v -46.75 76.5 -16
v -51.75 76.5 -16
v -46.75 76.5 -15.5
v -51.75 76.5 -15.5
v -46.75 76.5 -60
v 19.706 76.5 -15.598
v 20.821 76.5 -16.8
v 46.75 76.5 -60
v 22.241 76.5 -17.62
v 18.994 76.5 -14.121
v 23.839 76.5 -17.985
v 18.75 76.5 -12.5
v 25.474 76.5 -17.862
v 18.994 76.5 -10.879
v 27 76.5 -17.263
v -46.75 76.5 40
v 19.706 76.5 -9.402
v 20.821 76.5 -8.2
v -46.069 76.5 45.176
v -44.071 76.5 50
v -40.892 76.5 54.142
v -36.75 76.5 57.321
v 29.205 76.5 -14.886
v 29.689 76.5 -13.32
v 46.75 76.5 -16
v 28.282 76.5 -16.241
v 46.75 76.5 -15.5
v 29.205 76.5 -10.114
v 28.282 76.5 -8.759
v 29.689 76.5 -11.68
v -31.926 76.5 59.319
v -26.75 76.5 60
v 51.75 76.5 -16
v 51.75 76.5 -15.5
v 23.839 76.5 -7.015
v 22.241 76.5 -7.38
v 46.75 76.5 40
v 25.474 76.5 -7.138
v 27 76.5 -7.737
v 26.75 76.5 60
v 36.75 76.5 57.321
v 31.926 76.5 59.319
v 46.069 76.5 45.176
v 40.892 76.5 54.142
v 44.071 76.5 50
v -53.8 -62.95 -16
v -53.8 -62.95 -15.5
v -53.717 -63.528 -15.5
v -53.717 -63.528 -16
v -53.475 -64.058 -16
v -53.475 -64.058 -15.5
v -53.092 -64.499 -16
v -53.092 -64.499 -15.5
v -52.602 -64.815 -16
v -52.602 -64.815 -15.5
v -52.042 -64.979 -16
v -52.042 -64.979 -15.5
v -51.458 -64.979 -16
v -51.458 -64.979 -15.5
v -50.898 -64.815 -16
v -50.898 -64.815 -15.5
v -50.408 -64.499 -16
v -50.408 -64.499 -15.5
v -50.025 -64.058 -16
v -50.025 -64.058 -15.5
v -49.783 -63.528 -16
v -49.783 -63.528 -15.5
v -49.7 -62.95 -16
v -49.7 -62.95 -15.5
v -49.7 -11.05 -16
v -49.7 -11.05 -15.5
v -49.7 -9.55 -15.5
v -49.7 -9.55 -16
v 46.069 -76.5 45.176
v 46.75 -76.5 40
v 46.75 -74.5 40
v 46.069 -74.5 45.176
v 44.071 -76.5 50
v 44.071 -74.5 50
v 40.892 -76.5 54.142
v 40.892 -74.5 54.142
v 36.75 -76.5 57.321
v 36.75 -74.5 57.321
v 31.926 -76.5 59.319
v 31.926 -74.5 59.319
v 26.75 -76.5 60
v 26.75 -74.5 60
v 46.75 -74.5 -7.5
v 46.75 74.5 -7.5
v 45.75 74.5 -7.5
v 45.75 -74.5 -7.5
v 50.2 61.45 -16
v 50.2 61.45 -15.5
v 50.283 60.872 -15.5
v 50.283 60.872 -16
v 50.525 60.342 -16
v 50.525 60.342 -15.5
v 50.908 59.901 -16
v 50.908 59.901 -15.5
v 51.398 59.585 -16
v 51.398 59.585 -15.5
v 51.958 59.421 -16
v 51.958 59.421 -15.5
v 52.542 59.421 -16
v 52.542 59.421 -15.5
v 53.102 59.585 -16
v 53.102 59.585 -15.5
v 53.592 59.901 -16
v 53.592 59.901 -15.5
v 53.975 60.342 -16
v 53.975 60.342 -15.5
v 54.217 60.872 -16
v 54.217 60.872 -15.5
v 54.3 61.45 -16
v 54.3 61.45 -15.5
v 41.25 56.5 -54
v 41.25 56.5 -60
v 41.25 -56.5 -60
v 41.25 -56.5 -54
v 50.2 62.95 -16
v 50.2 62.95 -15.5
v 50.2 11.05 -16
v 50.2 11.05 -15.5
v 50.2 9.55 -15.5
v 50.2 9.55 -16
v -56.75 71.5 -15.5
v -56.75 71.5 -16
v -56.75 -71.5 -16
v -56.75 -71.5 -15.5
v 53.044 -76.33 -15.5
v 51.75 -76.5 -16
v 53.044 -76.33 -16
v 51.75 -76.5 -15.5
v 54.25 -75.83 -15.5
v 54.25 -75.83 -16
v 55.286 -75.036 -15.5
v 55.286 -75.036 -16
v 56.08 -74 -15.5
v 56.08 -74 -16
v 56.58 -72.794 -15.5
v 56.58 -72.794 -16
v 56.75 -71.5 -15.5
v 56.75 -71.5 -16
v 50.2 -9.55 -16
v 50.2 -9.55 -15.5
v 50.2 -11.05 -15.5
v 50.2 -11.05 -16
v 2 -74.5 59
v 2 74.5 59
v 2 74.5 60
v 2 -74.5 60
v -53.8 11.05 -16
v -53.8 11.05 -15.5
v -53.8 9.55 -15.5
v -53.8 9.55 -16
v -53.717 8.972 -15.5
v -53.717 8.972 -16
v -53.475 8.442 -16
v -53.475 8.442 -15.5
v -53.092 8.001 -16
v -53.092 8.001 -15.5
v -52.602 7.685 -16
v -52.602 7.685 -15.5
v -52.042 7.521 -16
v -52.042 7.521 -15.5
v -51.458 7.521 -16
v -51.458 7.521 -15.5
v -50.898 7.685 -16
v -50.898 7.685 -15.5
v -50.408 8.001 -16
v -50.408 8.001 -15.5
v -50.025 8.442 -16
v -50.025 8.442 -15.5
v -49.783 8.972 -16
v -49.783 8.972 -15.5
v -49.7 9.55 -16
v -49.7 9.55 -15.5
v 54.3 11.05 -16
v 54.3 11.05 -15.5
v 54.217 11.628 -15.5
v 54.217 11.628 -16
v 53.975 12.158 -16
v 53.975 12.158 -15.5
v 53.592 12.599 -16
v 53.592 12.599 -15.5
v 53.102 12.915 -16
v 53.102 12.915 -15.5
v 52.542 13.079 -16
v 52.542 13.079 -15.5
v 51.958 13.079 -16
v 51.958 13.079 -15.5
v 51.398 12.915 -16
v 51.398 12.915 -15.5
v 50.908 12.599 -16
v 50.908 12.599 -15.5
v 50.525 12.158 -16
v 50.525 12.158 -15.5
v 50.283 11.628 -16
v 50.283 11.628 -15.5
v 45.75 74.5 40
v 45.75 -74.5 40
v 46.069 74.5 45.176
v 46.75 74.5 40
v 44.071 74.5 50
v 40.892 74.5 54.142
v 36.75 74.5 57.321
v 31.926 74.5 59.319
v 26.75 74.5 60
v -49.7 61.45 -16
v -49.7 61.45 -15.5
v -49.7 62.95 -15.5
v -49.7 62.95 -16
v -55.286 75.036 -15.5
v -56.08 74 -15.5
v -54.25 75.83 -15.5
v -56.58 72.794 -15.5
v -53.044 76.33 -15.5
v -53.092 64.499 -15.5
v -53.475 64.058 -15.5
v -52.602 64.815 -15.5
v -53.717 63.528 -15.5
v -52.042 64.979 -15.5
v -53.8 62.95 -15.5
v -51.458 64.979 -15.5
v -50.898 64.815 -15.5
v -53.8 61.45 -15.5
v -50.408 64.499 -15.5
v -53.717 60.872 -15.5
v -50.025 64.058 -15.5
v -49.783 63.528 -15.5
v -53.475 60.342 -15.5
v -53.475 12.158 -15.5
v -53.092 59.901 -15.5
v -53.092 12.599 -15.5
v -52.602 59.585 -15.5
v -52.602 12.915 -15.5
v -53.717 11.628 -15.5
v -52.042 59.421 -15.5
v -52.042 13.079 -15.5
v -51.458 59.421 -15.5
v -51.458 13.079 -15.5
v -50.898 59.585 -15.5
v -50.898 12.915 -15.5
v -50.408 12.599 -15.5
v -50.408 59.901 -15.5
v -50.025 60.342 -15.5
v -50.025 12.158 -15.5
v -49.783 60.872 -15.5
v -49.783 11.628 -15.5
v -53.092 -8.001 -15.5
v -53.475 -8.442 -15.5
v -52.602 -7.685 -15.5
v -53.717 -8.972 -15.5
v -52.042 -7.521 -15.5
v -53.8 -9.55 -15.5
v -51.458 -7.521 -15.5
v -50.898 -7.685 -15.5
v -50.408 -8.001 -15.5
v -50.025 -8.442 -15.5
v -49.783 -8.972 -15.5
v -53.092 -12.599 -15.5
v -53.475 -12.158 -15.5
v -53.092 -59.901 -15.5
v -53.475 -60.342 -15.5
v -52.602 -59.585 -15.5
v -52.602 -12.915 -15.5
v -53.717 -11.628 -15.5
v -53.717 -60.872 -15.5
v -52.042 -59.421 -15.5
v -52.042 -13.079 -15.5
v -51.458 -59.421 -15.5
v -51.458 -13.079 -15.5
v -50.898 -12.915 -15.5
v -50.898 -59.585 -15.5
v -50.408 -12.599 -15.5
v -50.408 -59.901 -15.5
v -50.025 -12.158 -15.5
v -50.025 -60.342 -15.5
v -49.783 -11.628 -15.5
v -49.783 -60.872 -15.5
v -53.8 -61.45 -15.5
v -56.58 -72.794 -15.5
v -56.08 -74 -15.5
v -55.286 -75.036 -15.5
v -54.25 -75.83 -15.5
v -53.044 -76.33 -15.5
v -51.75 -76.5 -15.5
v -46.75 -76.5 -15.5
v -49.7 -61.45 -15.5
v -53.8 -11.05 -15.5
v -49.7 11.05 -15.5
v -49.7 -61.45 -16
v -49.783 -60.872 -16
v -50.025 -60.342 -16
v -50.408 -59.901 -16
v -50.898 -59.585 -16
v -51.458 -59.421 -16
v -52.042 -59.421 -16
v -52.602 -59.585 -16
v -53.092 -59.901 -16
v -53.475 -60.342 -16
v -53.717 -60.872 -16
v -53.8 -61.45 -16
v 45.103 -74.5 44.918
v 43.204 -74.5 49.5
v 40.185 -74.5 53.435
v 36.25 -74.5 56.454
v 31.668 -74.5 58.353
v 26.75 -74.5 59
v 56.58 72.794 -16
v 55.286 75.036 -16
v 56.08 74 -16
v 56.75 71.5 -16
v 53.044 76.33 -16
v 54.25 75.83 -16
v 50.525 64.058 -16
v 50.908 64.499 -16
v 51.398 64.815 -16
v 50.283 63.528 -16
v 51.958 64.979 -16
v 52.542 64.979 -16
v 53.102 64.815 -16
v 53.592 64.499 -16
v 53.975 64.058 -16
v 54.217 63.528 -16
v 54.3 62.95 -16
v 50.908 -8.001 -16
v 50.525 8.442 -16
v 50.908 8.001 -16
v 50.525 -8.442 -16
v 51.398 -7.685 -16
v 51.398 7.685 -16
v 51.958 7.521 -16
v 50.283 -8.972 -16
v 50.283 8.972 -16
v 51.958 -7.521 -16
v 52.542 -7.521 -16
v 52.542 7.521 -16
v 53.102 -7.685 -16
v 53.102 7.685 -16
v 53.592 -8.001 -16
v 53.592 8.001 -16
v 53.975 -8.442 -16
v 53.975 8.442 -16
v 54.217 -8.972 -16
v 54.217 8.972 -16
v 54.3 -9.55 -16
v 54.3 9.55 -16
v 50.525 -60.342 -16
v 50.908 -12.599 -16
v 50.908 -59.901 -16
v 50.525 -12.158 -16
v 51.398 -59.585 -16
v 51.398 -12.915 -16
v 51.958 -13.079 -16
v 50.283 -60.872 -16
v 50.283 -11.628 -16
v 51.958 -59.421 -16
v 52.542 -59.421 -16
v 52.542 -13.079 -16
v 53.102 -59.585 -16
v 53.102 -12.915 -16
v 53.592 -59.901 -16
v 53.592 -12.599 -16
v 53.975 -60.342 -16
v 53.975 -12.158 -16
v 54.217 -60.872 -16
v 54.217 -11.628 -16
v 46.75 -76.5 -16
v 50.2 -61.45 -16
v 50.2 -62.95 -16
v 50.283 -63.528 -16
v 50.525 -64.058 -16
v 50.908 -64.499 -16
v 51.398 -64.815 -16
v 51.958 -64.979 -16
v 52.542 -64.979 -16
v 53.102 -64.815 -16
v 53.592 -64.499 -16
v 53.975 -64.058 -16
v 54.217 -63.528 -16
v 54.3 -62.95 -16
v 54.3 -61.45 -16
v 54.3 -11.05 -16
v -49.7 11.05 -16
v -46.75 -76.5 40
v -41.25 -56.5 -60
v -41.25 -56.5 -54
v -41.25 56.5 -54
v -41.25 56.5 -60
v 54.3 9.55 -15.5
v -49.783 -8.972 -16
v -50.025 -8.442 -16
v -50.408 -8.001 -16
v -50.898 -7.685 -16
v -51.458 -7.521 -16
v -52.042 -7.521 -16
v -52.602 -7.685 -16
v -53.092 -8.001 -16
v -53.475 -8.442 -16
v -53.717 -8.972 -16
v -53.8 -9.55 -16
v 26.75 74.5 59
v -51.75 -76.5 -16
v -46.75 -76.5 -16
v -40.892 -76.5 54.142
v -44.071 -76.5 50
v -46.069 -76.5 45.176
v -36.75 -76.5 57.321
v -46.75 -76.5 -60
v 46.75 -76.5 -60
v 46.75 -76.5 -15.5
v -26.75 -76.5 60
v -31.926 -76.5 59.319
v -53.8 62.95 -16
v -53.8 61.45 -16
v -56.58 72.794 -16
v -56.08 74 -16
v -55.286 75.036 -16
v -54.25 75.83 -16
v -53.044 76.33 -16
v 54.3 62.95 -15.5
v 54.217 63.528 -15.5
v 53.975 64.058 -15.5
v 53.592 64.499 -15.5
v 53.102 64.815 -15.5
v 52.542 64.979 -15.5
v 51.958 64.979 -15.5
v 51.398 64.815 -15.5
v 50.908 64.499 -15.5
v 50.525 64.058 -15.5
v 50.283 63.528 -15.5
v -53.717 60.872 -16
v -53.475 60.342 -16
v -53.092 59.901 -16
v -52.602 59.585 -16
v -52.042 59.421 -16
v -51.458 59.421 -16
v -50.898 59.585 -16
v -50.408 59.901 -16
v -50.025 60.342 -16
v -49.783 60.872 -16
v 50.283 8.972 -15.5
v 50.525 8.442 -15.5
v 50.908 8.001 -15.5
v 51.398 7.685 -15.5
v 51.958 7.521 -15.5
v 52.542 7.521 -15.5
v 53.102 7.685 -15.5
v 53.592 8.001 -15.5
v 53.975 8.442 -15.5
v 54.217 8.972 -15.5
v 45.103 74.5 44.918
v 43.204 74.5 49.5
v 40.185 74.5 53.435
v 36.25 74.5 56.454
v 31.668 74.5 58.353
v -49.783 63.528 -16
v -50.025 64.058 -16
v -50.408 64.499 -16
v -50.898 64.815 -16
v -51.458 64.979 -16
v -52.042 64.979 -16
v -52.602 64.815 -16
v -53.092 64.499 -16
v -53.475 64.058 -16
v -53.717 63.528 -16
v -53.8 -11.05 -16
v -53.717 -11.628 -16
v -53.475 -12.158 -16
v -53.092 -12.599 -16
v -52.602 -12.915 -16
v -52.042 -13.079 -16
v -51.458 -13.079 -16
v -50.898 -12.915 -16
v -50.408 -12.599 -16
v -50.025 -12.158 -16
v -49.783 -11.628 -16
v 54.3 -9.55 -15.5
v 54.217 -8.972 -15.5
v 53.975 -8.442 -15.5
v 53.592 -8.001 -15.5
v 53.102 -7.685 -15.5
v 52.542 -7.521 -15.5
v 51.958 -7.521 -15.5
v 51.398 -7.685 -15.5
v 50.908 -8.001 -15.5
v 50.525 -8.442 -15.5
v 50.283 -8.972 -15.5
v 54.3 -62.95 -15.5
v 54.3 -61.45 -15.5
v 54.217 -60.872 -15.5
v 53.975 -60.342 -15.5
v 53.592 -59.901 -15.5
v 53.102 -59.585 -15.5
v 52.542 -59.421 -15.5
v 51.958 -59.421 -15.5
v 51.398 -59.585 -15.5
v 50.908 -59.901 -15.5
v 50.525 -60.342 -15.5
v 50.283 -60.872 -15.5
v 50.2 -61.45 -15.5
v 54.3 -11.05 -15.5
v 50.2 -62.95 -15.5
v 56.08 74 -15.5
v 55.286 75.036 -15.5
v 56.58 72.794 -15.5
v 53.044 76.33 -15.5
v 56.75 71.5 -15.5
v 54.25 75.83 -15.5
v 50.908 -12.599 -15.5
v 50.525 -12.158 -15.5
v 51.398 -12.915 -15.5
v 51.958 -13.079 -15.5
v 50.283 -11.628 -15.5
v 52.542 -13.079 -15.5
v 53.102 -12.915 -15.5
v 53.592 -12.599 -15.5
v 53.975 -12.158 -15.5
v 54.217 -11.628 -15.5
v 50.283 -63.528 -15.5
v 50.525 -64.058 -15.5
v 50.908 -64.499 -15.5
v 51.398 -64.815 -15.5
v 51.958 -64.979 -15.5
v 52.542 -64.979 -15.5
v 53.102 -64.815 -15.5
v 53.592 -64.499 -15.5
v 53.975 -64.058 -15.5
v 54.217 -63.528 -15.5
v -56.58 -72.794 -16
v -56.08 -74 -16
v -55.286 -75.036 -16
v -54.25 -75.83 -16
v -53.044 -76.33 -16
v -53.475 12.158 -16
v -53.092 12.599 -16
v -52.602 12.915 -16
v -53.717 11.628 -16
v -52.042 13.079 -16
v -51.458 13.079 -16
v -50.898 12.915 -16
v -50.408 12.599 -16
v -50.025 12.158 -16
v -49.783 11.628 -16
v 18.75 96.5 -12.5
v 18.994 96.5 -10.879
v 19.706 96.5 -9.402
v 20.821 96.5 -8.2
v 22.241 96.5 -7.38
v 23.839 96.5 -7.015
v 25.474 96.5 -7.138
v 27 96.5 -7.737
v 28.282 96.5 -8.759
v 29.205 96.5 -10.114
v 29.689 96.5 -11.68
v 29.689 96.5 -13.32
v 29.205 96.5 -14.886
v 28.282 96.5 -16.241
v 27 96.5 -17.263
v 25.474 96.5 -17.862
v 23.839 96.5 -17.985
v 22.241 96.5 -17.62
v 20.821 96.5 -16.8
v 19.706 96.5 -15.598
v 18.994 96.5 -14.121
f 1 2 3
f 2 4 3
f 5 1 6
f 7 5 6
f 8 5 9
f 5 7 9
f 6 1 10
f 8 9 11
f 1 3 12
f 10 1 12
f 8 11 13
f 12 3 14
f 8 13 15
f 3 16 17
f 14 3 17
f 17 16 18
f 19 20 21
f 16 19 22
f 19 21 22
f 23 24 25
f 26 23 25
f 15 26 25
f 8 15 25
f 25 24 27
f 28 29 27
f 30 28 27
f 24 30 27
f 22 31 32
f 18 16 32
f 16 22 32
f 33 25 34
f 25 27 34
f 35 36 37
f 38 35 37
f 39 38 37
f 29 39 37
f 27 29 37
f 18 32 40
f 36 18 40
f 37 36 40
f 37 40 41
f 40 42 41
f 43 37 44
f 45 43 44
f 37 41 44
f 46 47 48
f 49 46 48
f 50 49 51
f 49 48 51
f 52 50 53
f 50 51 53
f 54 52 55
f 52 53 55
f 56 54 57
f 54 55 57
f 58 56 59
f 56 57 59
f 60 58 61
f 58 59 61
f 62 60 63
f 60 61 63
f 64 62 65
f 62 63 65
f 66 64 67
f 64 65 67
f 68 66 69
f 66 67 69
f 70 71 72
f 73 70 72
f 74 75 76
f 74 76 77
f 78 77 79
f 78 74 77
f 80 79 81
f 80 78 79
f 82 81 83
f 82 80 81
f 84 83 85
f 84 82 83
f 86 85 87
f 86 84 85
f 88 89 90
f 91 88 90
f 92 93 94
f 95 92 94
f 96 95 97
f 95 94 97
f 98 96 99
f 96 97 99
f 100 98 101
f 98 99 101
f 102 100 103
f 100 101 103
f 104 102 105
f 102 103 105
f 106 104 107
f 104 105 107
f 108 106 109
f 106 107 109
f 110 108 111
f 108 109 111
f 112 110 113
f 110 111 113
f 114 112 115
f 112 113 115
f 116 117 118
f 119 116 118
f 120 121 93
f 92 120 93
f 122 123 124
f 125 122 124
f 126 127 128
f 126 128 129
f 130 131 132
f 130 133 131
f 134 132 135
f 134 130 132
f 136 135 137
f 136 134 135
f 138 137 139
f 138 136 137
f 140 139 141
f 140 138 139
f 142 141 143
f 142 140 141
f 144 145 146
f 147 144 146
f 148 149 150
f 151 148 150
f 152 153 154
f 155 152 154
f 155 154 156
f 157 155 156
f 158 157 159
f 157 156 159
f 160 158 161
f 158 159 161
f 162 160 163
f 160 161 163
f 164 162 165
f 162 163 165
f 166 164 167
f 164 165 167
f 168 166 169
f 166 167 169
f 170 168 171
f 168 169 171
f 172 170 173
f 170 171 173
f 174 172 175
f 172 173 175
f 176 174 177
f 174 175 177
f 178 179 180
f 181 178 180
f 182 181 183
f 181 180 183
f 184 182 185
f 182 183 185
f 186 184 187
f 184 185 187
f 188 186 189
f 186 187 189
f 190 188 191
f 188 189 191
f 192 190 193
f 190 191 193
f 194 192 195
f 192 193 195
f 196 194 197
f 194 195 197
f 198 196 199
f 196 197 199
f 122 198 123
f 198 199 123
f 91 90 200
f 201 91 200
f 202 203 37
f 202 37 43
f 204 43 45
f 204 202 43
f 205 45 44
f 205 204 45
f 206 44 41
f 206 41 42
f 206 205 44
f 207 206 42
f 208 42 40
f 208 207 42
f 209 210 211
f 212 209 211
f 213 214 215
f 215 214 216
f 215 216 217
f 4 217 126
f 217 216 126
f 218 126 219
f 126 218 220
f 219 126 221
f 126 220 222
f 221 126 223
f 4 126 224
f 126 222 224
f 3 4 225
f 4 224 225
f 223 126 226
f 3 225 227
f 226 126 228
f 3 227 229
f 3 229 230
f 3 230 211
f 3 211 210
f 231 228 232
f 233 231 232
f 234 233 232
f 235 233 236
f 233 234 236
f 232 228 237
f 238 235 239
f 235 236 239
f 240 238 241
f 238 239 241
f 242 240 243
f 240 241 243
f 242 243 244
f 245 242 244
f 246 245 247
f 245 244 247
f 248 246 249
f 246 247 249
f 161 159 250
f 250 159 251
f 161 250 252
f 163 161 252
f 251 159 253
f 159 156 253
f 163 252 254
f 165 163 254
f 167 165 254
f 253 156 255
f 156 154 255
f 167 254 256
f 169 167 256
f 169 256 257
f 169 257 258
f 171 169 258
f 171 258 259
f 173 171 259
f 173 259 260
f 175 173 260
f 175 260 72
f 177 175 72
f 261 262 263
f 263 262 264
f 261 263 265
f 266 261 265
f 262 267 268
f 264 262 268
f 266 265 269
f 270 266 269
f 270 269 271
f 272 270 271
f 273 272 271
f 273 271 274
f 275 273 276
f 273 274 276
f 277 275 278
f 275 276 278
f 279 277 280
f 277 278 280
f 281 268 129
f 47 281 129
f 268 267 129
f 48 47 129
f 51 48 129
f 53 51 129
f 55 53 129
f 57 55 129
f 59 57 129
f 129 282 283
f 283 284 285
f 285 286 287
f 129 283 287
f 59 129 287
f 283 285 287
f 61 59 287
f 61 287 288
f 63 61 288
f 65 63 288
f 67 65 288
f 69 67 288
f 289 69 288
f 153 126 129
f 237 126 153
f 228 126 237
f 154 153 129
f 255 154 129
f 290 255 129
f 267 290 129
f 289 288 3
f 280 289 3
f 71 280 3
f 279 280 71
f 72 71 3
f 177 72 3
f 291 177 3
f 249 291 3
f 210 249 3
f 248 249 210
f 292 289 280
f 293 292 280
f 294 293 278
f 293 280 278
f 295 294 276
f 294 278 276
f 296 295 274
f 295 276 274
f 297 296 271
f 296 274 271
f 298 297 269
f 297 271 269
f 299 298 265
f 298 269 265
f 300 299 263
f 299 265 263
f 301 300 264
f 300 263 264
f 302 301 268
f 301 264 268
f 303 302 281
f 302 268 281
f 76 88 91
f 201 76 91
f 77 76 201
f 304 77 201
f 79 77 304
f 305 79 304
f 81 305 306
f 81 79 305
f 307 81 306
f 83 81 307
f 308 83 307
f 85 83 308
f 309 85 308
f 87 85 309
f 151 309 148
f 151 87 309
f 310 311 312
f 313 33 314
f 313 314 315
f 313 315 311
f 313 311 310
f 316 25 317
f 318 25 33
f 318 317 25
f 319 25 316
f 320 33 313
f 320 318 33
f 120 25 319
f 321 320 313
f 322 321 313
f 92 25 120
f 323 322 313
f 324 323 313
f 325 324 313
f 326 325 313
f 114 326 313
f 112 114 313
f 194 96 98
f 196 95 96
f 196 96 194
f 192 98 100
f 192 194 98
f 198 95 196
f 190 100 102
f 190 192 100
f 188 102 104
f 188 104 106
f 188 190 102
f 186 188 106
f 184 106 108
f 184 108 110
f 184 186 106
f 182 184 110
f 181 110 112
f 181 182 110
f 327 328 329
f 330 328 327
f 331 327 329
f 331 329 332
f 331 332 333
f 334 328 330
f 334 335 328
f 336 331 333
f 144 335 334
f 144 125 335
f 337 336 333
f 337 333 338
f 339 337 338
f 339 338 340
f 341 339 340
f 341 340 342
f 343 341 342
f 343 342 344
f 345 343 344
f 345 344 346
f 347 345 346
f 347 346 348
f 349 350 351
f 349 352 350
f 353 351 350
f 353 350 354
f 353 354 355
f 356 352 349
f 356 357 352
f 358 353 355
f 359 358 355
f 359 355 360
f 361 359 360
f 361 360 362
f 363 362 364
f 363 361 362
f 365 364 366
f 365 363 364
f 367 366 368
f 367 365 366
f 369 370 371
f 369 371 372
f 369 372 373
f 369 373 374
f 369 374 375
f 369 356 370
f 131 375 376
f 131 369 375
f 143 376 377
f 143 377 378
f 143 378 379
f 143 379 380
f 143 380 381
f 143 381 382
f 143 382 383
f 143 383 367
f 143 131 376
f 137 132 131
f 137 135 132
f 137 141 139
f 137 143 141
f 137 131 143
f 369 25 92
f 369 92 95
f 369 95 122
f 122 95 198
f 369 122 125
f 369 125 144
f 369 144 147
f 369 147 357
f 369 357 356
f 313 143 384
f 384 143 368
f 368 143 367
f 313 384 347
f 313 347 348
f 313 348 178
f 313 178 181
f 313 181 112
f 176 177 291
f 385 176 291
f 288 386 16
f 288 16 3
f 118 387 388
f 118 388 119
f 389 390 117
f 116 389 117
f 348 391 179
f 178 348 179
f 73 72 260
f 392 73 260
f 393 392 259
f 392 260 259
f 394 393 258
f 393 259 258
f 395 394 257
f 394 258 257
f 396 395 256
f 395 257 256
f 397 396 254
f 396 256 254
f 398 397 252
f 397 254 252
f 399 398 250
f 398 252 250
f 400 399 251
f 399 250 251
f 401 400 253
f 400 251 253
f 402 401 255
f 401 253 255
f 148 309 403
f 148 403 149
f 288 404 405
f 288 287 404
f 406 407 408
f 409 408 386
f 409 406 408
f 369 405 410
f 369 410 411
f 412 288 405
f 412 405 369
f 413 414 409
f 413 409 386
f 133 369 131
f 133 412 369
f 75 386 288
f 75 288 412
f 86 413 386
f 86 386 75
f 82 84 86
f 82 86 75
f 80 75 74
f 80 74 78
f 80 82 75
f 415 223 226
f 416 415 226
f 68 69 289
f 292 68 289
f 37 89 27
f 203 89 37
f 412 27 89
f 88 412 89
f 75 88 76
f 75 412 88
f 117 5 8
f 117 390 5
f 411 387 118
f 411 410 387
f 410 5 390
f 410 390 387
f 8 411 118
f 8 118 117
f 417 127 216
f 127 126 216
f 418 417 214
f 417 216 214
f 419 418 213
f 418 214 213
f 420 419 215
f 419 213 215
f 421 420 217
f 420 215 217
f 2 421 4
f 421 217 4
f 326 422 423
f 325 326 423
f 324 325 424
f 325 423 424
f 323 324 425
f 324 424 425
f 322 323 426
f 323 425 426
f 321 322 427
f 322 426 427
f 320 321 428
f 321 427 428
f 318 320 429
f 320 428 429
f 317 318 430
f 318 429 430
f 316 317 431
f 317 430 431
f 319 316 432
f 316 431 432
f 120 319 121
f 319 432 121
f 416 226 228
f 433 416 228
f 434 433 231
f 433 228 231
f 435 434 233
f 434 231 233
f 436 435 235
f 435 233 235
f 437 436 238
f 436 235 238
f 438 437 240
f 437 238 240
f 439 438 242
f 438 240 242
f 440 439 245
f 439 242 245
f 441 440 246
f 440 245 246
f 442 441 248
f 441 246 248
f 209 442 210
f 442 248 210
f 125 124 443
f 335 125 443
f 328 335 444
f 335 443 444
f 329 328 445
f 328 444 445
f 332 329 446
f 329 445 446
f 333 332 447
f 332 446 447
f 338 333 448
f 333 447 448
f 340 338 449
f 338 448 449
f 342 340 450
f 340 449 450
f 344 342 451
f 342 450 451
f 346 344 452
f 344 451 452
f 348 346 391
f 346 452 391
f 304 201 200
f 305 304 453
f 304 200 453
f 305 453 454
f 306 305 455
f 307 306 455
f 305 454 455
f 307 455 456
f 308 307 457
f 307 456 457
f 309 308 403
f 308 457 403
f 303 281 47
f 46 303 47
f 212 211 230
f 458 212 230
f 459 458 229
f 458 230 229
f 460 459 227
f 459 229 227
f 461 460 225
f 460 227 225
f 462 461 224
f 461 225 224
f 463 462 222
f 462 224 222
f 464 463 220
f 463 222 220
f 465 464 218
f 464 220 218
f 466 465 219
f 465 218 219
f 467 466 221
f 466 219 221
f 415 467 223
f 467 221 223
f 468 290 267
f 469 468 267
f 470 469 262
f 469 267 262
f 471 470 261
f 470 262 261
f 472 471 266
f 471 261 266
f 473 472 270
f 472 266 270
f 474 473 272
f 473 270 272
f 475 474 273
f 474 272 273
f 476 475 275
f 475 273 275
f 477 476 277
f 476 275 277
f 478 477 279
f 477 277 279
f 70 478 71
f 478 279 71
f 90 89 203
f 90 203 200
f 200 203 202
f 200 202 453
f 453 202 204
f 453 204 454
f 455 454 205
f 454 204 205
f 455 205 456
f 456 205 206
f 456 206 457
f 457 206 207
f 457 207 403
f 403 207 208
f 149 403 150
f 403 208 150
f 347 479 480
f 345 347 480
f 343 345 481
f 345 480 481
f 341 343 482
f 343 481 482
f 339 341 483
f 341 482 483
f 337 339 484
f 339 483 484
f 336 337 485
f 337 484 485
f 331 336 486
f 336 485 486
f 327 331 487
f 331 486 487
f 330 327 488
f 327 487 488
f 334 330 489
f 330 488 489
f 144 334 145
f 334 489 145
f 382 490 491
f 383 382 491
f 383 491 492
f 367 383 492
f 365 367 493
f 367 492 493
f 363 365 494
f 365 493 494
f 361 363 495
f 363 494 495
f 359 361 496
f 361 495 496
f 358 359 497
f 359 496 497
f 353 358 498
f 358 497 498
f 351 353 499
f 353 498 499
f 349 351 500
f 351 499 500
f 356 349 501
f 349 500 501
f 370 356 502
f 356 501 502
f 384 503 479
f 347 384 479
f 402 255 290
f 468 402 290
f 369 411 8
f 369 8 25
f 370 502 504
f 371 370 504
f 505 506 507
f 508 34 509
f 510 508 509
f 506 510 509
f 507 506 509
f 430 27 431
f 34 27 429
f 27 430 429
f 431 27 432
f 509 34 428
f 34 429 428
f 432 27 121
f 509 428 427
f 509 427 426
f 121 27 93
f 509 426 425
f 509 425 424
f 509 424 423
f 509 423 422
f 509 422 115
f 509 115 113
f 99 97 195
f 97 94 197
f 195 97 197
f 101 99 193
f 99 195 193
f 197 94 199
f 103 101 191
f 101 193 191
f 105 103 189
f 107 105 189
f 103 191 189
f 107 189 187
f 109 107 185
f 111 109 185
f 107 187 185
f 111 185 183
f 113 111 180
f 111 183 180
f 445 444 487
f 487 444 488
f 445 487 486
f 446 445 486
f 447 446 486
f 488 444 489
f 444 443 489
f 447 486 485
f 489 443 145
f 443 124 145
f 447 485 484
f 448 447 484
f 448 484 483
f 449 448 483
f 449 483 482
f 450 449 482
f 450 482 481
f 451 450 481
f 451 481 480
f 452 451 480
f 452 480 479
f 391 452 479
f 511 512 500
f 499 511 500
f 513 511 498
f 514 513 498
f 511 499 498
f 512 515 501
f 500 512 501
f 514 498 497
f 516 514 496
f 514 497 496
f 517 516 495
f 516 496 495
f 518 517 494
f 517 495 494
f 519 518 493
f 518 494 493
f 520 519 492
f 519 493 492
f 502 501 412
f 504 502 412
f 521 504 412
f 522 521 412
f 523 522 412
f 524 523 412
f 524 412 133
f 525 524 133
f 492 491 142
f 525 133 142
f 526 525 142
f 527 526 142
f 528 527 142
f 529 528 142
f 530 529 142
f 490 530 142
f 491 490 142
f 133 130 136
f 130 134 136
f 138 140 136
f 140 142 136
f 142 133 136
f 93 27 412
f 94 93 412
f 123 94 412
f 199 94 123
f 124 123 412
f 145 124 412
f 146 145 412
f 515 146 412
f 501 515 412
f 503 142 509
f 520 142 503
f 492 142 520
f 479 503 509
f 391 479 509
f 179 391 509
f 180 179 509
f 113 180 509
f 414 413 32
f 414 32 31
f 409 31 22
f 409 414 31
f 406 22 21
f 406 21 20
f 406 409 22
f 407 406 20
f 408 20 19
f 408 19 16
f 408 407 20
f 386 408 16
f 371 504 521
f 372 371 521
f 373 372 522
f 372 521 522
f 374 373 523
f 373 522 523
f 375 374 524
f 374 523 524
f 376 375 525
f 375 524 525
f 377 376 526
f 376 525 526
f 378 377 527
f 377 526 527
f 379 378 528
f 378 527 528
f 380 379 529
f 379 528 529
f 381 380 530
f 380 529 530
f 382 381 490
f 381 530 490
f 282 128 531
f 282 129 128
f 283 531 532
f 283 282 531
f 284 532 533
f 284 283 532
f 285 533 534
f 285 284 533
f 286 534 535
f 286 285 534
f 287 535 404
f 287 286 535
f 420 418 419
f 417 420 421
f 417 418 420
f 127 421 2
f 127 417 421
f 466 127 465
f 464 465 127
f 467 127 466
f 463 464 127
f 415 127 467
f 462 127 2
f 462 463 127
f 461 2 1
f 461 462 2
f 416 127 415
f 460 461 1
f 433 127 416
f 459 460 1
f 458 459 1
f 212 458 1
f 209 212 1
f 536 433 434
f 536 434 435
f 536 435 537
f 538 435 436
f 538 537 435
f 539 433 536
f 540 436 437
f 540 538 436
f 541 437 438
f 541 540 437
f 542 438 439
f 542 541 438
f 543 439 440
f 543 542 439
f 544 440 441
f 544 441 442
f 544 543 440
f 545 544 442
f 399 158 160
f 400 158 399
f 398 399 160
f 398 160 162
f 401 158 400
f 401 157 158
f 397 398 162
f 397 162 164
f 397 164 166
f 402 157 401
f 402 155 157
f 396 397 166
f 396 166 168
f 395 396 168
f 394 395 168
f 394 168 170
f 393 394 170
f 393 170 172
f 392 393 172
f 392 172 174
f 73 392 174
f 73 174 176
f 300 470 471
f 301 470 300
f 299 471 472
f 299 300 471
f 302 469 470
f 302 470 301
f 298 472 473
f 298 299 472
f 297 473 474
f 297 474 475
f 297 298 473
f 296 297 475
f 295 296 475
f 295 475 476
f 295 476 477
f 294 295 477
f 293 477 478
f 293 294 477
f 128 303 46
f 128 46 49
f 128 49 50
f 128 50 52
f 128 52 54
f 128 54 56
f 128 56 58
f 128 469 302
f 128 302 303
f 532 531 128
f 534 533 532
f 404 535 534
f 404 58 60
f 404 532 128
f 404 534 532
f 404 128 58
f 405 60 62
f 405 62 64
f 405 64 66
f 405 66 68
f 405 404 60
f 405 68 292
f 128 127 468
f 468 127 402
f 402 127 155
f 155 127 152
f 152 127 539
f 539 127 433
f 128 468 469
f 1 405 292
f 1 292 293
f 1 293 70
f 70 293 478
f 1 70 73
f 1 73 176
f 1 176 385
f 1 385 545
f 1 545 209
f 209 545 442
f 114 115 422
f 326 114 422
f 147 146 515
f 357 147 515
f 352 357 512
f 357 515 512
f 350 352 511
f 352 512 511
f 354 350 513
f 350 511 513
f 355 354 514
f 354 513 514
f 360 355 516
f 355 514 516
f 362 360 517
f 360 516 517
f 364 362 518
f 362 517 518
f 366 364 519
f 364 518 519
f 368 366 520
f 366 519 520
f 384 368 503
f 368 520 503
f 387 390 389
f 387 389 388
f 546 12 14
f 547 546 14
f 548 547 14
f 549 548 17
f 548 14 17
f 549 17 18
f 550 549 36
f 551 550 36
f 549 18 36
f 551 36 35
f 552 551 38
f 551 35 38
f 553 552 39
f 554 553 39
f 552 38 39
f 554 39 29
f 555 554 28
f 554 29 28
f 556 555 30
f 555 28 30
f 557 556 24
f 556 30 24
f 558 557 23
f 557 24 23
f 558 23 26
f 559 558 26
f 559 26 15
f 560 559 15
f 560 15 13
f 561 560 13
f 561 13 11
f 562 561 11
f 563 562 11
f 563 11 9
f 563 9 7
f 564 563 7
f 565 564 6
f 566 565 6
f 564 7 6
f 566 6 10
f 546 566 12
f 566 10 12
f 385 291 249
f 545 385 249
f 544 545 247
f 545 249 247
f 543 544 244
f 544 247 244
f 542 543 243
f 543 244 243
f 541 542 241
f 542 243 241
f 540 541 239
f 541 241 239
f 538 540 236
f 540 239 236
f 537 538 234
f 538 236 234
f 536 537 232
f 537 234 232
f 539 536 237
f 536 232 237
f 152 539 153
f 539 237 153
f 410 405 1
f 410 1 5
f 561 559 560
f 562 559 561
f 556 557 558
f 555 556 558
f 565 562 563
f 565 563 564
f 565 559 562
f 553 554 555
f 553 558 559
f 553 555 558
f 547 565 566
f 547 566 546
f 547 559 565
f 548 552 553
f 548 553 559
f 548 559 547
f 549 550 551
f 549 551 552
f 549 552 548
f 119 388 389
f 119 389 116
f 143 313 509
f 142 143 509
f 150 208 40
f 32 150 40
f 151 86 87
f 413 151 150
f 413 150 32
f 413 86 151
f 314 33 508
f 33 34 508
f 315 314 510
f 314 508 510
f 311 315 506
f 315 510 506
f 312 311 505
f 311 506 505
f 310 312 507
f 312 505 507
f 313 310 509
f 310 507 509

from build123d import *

# Parameters (mm, degrees)
F1_DEPTH  = 76.5
F2_W      = 113.5
F2_H      = 0.5
F3_DEPTH  = 153
F4_R      = 5
F6_DEPTH  = 44.501
F7_R      = 5.5
F8_DEPTH  = 20
F9_W      = 82.5
F9_H      = 113
F10_DEPTH = 6
F12_START = -2
F12_DEPTH = 149


with BuildPart() as f1:
    # F0 (on Front) → F1 (new body, symmetric)
    with BuildSketch(Plane.XZ):
        with BuildLine():
            ThreePointArc((46.75, 40), (12.6078643763, 25.8578643763), (26.75, 60))
            Line((26.75, 60), (-26.75, 60))
            ThreePointArc((-26.75, 60), (-12.6078643763, 54.1421356237), (-6.75, 40))
            ThreePointArc((-6.75, 40), (-26.75, 20), (-46.75, 40))
            Line((-46.75, 40), (-46.75, -60))
            Line((-46.75, -60), (46.75, -60))
            Line((46.75, -60), (46.75, 40))
        make_face()
        with BuildLine():
            ThreePointArc((46.75, 40), (40.8921356237, 54.1421356237), (26.75, 60))
            ThreePointArc((26.75, 60), (12.6078643763, 25.8578643763), (46.75, 40))
        make_face()
        with BuildLine():
            ThreePointArc((-6.75, 40), (-12.6078643763, 54.1421356237), (-26.75, 60))
            ThreePointArc((-26.75, 60), (-40.8921356237, 54.1421356237), (-46.75, 40))
            ThreePointArc((-46.75, 40), (-26.75, 20), (-6.75, 40))
        make_face()
    extrude(amount=F1_DEPTH, both=True)

    # F2 (on face) → F3 (join, through all)
    with BuildSketch(Plane.XZ.offset(76.5)):
        with Locations((0, -15.75)):
            Rectangle(F2_W, F2_H)
    extrude(amount=-F3_DEPTH)

    # F4
    f4_edges = [f1.edges().sort_by_distance(p)[0] for p in [
        (56.75, 76.5, -15.75),
        (-56.75, 76.5, -15.75),
        (-56.75, -76.5, -15.75),
        (56.75, -76.5, -15.75),
    ]]
    fillet(f4_edges, radius=F4_R)

    # F5 (on face) → F6 (cut, through all)
    with BuildSketch(Plane.XY.offset(-15.5)):
        with BuildLine():
            ThreePointArc((-49.7, 62.95), (-51.75, 65), (-53.8, 62.95))
            Line((-53.8, 62.95), (-53.8, 61.45))
            ThreePointArc((-53.8, 61.45), (-51.75, 59.4), (-49.7, 61.45))
            Line((-49.7, 61.45), (-49.7, 62.95))
        make_face()
        with BuildLine():
            ThreePointArc((-49.7, 11.05), (-51.75, 13.1), (-53.8, 11.05))
            Line((-53.8, 11.05), (-53.8, 9.55))
            ThreePointArc((-53.8, 9.55), (-51.75, 7.5), (-49.7, 9.55))
            Line((-49.7, 9.55), (-49.7, 11.05))
        make_face()
        with BuildLine():
            ThreePointArc((54.3, 62.95), (52.25, 65), (50.2, 62.95))
            Line((50.2, 62.95), (50.2, 61.45))
            ThreePointArc((50.2, 61.45), (52.25, 59.4), (54.3, 61.45))
            Line((54.3, 61.45), (54.3, 62.95))
        make_face()
        with BuildLine():
            ThreePointArc((54.3, 11.05), (52.25, 13.1), (50.2, 11.05))
            Line((50.2, 11.05), (50.2, 9.55))
            ThreePointArc((50.2, 9.55), (52.25, 7.5), (54.3, 9.55))
            Line((54.3, 9.55), (54.3, 11.05))
        make_face()
        with BuildLine():
            Line((-49.7, -62.95), (-49.7, -61.45))
            ThreePointArc((-49.7, -61.45), (-51.75, -59.4), (-53.8, -61.45))
            Line((-53.8, -61.45), (-53.8, -62.95))
            ThreePointArc((-53.8, -62.95), (-51.75, -65), (-49.7, -62.95))
        make_face()
        with BuildLine():
            Line((-53.8, -9.55), (-53.8, -11.05))
            ThreePointArc((-53.8, -11.05), (-51.75, -13.1), (-49.7, -11.05))
            Line((-49.7, -11.05), (-49.7, -9.55))
            ThreePointArc((-49.7, -9.55), (-51.75, -7.5), (-53.8, -9.55))
        make_face()
        with BuildLine():
            Line((54.3, -11.05), (54.3, -9.55))
            ThreePointArc((54.3, -9.55), (52.25, -7.5), (50.2, -9.55))
            Line((50.2, -9.55), (50.2, -11.05))
            ThreePointArc((50.2, -11.05), (52.25, -13.1), (54.3, -11.05))
        make_face()
        with BuildLine():
            Line((54.3, -62.95), (54.3, -61.45))
            ThreePointArc((54.3, -61.45), (52.25, -59.4), (50.2, -61.45))
            Line((50.2, -61.45), (50.2, -62.95))
            ThreePointArc((50.2, -62.95), (52.25, -65), (54.3, -62.95))
        make_face()
    extrude(amount=-F6_DEPTH, mode=Mode.SUBTRACT)

    # F7 (on face) → F8 (join)
    with BuildSketch(Plane(origin=(0, 76.5, 0), x_dir=(-1, 0, 0), z_dir=(0, 1, 0))):
        with Locations((-24.25, -12.5)):
            Circle(F7_R)
    extrude(amount=F8_DEPTH)

    # F9 (on face) → F10 (cut)
    with BuildSketch(Plane(origin=(0, 0, -60), x_dir=(1, 0, 0), z_dir=(0, 0, -1))):
        Rectangle(F9_W, F9_H)
    extrude(amount=-F10_DEPTH, mode=Mode.SUBTRACT)

    # F11 (on face) → F12 (cut)
    with BuildSketch(Plane(origin=(0, 76.5, 0), x_dir=(-1, 0, 0), z_dir=(0, 1, 0)).offset(F12_START)):
        with BuildLine():
            ThreePointArc((-45.75, 40), (-40.1850288425, 53.4350288425), (-26.75, 59))
            Line((-26.75, 59), (-2, 59))
            Line((-2, 59), (-2, 60))
            Line((-2, 60), (-26.75, 60))
            ThreePointArc((-26.75, 60), (-40.8921356237, 54.1421356237), (-46.75, 40))
            Line((-46.75, 40), (-46.75, -7.5))
            Line((-46.75, -7.5), (-45.75, -7.5))
            Line((-45.75, -7.5), (-45.75, 40))
        make_face()
    extrude(amount=-F12_DEPTH, mode=Mode.SUBTRACT)


solid = f1.part
